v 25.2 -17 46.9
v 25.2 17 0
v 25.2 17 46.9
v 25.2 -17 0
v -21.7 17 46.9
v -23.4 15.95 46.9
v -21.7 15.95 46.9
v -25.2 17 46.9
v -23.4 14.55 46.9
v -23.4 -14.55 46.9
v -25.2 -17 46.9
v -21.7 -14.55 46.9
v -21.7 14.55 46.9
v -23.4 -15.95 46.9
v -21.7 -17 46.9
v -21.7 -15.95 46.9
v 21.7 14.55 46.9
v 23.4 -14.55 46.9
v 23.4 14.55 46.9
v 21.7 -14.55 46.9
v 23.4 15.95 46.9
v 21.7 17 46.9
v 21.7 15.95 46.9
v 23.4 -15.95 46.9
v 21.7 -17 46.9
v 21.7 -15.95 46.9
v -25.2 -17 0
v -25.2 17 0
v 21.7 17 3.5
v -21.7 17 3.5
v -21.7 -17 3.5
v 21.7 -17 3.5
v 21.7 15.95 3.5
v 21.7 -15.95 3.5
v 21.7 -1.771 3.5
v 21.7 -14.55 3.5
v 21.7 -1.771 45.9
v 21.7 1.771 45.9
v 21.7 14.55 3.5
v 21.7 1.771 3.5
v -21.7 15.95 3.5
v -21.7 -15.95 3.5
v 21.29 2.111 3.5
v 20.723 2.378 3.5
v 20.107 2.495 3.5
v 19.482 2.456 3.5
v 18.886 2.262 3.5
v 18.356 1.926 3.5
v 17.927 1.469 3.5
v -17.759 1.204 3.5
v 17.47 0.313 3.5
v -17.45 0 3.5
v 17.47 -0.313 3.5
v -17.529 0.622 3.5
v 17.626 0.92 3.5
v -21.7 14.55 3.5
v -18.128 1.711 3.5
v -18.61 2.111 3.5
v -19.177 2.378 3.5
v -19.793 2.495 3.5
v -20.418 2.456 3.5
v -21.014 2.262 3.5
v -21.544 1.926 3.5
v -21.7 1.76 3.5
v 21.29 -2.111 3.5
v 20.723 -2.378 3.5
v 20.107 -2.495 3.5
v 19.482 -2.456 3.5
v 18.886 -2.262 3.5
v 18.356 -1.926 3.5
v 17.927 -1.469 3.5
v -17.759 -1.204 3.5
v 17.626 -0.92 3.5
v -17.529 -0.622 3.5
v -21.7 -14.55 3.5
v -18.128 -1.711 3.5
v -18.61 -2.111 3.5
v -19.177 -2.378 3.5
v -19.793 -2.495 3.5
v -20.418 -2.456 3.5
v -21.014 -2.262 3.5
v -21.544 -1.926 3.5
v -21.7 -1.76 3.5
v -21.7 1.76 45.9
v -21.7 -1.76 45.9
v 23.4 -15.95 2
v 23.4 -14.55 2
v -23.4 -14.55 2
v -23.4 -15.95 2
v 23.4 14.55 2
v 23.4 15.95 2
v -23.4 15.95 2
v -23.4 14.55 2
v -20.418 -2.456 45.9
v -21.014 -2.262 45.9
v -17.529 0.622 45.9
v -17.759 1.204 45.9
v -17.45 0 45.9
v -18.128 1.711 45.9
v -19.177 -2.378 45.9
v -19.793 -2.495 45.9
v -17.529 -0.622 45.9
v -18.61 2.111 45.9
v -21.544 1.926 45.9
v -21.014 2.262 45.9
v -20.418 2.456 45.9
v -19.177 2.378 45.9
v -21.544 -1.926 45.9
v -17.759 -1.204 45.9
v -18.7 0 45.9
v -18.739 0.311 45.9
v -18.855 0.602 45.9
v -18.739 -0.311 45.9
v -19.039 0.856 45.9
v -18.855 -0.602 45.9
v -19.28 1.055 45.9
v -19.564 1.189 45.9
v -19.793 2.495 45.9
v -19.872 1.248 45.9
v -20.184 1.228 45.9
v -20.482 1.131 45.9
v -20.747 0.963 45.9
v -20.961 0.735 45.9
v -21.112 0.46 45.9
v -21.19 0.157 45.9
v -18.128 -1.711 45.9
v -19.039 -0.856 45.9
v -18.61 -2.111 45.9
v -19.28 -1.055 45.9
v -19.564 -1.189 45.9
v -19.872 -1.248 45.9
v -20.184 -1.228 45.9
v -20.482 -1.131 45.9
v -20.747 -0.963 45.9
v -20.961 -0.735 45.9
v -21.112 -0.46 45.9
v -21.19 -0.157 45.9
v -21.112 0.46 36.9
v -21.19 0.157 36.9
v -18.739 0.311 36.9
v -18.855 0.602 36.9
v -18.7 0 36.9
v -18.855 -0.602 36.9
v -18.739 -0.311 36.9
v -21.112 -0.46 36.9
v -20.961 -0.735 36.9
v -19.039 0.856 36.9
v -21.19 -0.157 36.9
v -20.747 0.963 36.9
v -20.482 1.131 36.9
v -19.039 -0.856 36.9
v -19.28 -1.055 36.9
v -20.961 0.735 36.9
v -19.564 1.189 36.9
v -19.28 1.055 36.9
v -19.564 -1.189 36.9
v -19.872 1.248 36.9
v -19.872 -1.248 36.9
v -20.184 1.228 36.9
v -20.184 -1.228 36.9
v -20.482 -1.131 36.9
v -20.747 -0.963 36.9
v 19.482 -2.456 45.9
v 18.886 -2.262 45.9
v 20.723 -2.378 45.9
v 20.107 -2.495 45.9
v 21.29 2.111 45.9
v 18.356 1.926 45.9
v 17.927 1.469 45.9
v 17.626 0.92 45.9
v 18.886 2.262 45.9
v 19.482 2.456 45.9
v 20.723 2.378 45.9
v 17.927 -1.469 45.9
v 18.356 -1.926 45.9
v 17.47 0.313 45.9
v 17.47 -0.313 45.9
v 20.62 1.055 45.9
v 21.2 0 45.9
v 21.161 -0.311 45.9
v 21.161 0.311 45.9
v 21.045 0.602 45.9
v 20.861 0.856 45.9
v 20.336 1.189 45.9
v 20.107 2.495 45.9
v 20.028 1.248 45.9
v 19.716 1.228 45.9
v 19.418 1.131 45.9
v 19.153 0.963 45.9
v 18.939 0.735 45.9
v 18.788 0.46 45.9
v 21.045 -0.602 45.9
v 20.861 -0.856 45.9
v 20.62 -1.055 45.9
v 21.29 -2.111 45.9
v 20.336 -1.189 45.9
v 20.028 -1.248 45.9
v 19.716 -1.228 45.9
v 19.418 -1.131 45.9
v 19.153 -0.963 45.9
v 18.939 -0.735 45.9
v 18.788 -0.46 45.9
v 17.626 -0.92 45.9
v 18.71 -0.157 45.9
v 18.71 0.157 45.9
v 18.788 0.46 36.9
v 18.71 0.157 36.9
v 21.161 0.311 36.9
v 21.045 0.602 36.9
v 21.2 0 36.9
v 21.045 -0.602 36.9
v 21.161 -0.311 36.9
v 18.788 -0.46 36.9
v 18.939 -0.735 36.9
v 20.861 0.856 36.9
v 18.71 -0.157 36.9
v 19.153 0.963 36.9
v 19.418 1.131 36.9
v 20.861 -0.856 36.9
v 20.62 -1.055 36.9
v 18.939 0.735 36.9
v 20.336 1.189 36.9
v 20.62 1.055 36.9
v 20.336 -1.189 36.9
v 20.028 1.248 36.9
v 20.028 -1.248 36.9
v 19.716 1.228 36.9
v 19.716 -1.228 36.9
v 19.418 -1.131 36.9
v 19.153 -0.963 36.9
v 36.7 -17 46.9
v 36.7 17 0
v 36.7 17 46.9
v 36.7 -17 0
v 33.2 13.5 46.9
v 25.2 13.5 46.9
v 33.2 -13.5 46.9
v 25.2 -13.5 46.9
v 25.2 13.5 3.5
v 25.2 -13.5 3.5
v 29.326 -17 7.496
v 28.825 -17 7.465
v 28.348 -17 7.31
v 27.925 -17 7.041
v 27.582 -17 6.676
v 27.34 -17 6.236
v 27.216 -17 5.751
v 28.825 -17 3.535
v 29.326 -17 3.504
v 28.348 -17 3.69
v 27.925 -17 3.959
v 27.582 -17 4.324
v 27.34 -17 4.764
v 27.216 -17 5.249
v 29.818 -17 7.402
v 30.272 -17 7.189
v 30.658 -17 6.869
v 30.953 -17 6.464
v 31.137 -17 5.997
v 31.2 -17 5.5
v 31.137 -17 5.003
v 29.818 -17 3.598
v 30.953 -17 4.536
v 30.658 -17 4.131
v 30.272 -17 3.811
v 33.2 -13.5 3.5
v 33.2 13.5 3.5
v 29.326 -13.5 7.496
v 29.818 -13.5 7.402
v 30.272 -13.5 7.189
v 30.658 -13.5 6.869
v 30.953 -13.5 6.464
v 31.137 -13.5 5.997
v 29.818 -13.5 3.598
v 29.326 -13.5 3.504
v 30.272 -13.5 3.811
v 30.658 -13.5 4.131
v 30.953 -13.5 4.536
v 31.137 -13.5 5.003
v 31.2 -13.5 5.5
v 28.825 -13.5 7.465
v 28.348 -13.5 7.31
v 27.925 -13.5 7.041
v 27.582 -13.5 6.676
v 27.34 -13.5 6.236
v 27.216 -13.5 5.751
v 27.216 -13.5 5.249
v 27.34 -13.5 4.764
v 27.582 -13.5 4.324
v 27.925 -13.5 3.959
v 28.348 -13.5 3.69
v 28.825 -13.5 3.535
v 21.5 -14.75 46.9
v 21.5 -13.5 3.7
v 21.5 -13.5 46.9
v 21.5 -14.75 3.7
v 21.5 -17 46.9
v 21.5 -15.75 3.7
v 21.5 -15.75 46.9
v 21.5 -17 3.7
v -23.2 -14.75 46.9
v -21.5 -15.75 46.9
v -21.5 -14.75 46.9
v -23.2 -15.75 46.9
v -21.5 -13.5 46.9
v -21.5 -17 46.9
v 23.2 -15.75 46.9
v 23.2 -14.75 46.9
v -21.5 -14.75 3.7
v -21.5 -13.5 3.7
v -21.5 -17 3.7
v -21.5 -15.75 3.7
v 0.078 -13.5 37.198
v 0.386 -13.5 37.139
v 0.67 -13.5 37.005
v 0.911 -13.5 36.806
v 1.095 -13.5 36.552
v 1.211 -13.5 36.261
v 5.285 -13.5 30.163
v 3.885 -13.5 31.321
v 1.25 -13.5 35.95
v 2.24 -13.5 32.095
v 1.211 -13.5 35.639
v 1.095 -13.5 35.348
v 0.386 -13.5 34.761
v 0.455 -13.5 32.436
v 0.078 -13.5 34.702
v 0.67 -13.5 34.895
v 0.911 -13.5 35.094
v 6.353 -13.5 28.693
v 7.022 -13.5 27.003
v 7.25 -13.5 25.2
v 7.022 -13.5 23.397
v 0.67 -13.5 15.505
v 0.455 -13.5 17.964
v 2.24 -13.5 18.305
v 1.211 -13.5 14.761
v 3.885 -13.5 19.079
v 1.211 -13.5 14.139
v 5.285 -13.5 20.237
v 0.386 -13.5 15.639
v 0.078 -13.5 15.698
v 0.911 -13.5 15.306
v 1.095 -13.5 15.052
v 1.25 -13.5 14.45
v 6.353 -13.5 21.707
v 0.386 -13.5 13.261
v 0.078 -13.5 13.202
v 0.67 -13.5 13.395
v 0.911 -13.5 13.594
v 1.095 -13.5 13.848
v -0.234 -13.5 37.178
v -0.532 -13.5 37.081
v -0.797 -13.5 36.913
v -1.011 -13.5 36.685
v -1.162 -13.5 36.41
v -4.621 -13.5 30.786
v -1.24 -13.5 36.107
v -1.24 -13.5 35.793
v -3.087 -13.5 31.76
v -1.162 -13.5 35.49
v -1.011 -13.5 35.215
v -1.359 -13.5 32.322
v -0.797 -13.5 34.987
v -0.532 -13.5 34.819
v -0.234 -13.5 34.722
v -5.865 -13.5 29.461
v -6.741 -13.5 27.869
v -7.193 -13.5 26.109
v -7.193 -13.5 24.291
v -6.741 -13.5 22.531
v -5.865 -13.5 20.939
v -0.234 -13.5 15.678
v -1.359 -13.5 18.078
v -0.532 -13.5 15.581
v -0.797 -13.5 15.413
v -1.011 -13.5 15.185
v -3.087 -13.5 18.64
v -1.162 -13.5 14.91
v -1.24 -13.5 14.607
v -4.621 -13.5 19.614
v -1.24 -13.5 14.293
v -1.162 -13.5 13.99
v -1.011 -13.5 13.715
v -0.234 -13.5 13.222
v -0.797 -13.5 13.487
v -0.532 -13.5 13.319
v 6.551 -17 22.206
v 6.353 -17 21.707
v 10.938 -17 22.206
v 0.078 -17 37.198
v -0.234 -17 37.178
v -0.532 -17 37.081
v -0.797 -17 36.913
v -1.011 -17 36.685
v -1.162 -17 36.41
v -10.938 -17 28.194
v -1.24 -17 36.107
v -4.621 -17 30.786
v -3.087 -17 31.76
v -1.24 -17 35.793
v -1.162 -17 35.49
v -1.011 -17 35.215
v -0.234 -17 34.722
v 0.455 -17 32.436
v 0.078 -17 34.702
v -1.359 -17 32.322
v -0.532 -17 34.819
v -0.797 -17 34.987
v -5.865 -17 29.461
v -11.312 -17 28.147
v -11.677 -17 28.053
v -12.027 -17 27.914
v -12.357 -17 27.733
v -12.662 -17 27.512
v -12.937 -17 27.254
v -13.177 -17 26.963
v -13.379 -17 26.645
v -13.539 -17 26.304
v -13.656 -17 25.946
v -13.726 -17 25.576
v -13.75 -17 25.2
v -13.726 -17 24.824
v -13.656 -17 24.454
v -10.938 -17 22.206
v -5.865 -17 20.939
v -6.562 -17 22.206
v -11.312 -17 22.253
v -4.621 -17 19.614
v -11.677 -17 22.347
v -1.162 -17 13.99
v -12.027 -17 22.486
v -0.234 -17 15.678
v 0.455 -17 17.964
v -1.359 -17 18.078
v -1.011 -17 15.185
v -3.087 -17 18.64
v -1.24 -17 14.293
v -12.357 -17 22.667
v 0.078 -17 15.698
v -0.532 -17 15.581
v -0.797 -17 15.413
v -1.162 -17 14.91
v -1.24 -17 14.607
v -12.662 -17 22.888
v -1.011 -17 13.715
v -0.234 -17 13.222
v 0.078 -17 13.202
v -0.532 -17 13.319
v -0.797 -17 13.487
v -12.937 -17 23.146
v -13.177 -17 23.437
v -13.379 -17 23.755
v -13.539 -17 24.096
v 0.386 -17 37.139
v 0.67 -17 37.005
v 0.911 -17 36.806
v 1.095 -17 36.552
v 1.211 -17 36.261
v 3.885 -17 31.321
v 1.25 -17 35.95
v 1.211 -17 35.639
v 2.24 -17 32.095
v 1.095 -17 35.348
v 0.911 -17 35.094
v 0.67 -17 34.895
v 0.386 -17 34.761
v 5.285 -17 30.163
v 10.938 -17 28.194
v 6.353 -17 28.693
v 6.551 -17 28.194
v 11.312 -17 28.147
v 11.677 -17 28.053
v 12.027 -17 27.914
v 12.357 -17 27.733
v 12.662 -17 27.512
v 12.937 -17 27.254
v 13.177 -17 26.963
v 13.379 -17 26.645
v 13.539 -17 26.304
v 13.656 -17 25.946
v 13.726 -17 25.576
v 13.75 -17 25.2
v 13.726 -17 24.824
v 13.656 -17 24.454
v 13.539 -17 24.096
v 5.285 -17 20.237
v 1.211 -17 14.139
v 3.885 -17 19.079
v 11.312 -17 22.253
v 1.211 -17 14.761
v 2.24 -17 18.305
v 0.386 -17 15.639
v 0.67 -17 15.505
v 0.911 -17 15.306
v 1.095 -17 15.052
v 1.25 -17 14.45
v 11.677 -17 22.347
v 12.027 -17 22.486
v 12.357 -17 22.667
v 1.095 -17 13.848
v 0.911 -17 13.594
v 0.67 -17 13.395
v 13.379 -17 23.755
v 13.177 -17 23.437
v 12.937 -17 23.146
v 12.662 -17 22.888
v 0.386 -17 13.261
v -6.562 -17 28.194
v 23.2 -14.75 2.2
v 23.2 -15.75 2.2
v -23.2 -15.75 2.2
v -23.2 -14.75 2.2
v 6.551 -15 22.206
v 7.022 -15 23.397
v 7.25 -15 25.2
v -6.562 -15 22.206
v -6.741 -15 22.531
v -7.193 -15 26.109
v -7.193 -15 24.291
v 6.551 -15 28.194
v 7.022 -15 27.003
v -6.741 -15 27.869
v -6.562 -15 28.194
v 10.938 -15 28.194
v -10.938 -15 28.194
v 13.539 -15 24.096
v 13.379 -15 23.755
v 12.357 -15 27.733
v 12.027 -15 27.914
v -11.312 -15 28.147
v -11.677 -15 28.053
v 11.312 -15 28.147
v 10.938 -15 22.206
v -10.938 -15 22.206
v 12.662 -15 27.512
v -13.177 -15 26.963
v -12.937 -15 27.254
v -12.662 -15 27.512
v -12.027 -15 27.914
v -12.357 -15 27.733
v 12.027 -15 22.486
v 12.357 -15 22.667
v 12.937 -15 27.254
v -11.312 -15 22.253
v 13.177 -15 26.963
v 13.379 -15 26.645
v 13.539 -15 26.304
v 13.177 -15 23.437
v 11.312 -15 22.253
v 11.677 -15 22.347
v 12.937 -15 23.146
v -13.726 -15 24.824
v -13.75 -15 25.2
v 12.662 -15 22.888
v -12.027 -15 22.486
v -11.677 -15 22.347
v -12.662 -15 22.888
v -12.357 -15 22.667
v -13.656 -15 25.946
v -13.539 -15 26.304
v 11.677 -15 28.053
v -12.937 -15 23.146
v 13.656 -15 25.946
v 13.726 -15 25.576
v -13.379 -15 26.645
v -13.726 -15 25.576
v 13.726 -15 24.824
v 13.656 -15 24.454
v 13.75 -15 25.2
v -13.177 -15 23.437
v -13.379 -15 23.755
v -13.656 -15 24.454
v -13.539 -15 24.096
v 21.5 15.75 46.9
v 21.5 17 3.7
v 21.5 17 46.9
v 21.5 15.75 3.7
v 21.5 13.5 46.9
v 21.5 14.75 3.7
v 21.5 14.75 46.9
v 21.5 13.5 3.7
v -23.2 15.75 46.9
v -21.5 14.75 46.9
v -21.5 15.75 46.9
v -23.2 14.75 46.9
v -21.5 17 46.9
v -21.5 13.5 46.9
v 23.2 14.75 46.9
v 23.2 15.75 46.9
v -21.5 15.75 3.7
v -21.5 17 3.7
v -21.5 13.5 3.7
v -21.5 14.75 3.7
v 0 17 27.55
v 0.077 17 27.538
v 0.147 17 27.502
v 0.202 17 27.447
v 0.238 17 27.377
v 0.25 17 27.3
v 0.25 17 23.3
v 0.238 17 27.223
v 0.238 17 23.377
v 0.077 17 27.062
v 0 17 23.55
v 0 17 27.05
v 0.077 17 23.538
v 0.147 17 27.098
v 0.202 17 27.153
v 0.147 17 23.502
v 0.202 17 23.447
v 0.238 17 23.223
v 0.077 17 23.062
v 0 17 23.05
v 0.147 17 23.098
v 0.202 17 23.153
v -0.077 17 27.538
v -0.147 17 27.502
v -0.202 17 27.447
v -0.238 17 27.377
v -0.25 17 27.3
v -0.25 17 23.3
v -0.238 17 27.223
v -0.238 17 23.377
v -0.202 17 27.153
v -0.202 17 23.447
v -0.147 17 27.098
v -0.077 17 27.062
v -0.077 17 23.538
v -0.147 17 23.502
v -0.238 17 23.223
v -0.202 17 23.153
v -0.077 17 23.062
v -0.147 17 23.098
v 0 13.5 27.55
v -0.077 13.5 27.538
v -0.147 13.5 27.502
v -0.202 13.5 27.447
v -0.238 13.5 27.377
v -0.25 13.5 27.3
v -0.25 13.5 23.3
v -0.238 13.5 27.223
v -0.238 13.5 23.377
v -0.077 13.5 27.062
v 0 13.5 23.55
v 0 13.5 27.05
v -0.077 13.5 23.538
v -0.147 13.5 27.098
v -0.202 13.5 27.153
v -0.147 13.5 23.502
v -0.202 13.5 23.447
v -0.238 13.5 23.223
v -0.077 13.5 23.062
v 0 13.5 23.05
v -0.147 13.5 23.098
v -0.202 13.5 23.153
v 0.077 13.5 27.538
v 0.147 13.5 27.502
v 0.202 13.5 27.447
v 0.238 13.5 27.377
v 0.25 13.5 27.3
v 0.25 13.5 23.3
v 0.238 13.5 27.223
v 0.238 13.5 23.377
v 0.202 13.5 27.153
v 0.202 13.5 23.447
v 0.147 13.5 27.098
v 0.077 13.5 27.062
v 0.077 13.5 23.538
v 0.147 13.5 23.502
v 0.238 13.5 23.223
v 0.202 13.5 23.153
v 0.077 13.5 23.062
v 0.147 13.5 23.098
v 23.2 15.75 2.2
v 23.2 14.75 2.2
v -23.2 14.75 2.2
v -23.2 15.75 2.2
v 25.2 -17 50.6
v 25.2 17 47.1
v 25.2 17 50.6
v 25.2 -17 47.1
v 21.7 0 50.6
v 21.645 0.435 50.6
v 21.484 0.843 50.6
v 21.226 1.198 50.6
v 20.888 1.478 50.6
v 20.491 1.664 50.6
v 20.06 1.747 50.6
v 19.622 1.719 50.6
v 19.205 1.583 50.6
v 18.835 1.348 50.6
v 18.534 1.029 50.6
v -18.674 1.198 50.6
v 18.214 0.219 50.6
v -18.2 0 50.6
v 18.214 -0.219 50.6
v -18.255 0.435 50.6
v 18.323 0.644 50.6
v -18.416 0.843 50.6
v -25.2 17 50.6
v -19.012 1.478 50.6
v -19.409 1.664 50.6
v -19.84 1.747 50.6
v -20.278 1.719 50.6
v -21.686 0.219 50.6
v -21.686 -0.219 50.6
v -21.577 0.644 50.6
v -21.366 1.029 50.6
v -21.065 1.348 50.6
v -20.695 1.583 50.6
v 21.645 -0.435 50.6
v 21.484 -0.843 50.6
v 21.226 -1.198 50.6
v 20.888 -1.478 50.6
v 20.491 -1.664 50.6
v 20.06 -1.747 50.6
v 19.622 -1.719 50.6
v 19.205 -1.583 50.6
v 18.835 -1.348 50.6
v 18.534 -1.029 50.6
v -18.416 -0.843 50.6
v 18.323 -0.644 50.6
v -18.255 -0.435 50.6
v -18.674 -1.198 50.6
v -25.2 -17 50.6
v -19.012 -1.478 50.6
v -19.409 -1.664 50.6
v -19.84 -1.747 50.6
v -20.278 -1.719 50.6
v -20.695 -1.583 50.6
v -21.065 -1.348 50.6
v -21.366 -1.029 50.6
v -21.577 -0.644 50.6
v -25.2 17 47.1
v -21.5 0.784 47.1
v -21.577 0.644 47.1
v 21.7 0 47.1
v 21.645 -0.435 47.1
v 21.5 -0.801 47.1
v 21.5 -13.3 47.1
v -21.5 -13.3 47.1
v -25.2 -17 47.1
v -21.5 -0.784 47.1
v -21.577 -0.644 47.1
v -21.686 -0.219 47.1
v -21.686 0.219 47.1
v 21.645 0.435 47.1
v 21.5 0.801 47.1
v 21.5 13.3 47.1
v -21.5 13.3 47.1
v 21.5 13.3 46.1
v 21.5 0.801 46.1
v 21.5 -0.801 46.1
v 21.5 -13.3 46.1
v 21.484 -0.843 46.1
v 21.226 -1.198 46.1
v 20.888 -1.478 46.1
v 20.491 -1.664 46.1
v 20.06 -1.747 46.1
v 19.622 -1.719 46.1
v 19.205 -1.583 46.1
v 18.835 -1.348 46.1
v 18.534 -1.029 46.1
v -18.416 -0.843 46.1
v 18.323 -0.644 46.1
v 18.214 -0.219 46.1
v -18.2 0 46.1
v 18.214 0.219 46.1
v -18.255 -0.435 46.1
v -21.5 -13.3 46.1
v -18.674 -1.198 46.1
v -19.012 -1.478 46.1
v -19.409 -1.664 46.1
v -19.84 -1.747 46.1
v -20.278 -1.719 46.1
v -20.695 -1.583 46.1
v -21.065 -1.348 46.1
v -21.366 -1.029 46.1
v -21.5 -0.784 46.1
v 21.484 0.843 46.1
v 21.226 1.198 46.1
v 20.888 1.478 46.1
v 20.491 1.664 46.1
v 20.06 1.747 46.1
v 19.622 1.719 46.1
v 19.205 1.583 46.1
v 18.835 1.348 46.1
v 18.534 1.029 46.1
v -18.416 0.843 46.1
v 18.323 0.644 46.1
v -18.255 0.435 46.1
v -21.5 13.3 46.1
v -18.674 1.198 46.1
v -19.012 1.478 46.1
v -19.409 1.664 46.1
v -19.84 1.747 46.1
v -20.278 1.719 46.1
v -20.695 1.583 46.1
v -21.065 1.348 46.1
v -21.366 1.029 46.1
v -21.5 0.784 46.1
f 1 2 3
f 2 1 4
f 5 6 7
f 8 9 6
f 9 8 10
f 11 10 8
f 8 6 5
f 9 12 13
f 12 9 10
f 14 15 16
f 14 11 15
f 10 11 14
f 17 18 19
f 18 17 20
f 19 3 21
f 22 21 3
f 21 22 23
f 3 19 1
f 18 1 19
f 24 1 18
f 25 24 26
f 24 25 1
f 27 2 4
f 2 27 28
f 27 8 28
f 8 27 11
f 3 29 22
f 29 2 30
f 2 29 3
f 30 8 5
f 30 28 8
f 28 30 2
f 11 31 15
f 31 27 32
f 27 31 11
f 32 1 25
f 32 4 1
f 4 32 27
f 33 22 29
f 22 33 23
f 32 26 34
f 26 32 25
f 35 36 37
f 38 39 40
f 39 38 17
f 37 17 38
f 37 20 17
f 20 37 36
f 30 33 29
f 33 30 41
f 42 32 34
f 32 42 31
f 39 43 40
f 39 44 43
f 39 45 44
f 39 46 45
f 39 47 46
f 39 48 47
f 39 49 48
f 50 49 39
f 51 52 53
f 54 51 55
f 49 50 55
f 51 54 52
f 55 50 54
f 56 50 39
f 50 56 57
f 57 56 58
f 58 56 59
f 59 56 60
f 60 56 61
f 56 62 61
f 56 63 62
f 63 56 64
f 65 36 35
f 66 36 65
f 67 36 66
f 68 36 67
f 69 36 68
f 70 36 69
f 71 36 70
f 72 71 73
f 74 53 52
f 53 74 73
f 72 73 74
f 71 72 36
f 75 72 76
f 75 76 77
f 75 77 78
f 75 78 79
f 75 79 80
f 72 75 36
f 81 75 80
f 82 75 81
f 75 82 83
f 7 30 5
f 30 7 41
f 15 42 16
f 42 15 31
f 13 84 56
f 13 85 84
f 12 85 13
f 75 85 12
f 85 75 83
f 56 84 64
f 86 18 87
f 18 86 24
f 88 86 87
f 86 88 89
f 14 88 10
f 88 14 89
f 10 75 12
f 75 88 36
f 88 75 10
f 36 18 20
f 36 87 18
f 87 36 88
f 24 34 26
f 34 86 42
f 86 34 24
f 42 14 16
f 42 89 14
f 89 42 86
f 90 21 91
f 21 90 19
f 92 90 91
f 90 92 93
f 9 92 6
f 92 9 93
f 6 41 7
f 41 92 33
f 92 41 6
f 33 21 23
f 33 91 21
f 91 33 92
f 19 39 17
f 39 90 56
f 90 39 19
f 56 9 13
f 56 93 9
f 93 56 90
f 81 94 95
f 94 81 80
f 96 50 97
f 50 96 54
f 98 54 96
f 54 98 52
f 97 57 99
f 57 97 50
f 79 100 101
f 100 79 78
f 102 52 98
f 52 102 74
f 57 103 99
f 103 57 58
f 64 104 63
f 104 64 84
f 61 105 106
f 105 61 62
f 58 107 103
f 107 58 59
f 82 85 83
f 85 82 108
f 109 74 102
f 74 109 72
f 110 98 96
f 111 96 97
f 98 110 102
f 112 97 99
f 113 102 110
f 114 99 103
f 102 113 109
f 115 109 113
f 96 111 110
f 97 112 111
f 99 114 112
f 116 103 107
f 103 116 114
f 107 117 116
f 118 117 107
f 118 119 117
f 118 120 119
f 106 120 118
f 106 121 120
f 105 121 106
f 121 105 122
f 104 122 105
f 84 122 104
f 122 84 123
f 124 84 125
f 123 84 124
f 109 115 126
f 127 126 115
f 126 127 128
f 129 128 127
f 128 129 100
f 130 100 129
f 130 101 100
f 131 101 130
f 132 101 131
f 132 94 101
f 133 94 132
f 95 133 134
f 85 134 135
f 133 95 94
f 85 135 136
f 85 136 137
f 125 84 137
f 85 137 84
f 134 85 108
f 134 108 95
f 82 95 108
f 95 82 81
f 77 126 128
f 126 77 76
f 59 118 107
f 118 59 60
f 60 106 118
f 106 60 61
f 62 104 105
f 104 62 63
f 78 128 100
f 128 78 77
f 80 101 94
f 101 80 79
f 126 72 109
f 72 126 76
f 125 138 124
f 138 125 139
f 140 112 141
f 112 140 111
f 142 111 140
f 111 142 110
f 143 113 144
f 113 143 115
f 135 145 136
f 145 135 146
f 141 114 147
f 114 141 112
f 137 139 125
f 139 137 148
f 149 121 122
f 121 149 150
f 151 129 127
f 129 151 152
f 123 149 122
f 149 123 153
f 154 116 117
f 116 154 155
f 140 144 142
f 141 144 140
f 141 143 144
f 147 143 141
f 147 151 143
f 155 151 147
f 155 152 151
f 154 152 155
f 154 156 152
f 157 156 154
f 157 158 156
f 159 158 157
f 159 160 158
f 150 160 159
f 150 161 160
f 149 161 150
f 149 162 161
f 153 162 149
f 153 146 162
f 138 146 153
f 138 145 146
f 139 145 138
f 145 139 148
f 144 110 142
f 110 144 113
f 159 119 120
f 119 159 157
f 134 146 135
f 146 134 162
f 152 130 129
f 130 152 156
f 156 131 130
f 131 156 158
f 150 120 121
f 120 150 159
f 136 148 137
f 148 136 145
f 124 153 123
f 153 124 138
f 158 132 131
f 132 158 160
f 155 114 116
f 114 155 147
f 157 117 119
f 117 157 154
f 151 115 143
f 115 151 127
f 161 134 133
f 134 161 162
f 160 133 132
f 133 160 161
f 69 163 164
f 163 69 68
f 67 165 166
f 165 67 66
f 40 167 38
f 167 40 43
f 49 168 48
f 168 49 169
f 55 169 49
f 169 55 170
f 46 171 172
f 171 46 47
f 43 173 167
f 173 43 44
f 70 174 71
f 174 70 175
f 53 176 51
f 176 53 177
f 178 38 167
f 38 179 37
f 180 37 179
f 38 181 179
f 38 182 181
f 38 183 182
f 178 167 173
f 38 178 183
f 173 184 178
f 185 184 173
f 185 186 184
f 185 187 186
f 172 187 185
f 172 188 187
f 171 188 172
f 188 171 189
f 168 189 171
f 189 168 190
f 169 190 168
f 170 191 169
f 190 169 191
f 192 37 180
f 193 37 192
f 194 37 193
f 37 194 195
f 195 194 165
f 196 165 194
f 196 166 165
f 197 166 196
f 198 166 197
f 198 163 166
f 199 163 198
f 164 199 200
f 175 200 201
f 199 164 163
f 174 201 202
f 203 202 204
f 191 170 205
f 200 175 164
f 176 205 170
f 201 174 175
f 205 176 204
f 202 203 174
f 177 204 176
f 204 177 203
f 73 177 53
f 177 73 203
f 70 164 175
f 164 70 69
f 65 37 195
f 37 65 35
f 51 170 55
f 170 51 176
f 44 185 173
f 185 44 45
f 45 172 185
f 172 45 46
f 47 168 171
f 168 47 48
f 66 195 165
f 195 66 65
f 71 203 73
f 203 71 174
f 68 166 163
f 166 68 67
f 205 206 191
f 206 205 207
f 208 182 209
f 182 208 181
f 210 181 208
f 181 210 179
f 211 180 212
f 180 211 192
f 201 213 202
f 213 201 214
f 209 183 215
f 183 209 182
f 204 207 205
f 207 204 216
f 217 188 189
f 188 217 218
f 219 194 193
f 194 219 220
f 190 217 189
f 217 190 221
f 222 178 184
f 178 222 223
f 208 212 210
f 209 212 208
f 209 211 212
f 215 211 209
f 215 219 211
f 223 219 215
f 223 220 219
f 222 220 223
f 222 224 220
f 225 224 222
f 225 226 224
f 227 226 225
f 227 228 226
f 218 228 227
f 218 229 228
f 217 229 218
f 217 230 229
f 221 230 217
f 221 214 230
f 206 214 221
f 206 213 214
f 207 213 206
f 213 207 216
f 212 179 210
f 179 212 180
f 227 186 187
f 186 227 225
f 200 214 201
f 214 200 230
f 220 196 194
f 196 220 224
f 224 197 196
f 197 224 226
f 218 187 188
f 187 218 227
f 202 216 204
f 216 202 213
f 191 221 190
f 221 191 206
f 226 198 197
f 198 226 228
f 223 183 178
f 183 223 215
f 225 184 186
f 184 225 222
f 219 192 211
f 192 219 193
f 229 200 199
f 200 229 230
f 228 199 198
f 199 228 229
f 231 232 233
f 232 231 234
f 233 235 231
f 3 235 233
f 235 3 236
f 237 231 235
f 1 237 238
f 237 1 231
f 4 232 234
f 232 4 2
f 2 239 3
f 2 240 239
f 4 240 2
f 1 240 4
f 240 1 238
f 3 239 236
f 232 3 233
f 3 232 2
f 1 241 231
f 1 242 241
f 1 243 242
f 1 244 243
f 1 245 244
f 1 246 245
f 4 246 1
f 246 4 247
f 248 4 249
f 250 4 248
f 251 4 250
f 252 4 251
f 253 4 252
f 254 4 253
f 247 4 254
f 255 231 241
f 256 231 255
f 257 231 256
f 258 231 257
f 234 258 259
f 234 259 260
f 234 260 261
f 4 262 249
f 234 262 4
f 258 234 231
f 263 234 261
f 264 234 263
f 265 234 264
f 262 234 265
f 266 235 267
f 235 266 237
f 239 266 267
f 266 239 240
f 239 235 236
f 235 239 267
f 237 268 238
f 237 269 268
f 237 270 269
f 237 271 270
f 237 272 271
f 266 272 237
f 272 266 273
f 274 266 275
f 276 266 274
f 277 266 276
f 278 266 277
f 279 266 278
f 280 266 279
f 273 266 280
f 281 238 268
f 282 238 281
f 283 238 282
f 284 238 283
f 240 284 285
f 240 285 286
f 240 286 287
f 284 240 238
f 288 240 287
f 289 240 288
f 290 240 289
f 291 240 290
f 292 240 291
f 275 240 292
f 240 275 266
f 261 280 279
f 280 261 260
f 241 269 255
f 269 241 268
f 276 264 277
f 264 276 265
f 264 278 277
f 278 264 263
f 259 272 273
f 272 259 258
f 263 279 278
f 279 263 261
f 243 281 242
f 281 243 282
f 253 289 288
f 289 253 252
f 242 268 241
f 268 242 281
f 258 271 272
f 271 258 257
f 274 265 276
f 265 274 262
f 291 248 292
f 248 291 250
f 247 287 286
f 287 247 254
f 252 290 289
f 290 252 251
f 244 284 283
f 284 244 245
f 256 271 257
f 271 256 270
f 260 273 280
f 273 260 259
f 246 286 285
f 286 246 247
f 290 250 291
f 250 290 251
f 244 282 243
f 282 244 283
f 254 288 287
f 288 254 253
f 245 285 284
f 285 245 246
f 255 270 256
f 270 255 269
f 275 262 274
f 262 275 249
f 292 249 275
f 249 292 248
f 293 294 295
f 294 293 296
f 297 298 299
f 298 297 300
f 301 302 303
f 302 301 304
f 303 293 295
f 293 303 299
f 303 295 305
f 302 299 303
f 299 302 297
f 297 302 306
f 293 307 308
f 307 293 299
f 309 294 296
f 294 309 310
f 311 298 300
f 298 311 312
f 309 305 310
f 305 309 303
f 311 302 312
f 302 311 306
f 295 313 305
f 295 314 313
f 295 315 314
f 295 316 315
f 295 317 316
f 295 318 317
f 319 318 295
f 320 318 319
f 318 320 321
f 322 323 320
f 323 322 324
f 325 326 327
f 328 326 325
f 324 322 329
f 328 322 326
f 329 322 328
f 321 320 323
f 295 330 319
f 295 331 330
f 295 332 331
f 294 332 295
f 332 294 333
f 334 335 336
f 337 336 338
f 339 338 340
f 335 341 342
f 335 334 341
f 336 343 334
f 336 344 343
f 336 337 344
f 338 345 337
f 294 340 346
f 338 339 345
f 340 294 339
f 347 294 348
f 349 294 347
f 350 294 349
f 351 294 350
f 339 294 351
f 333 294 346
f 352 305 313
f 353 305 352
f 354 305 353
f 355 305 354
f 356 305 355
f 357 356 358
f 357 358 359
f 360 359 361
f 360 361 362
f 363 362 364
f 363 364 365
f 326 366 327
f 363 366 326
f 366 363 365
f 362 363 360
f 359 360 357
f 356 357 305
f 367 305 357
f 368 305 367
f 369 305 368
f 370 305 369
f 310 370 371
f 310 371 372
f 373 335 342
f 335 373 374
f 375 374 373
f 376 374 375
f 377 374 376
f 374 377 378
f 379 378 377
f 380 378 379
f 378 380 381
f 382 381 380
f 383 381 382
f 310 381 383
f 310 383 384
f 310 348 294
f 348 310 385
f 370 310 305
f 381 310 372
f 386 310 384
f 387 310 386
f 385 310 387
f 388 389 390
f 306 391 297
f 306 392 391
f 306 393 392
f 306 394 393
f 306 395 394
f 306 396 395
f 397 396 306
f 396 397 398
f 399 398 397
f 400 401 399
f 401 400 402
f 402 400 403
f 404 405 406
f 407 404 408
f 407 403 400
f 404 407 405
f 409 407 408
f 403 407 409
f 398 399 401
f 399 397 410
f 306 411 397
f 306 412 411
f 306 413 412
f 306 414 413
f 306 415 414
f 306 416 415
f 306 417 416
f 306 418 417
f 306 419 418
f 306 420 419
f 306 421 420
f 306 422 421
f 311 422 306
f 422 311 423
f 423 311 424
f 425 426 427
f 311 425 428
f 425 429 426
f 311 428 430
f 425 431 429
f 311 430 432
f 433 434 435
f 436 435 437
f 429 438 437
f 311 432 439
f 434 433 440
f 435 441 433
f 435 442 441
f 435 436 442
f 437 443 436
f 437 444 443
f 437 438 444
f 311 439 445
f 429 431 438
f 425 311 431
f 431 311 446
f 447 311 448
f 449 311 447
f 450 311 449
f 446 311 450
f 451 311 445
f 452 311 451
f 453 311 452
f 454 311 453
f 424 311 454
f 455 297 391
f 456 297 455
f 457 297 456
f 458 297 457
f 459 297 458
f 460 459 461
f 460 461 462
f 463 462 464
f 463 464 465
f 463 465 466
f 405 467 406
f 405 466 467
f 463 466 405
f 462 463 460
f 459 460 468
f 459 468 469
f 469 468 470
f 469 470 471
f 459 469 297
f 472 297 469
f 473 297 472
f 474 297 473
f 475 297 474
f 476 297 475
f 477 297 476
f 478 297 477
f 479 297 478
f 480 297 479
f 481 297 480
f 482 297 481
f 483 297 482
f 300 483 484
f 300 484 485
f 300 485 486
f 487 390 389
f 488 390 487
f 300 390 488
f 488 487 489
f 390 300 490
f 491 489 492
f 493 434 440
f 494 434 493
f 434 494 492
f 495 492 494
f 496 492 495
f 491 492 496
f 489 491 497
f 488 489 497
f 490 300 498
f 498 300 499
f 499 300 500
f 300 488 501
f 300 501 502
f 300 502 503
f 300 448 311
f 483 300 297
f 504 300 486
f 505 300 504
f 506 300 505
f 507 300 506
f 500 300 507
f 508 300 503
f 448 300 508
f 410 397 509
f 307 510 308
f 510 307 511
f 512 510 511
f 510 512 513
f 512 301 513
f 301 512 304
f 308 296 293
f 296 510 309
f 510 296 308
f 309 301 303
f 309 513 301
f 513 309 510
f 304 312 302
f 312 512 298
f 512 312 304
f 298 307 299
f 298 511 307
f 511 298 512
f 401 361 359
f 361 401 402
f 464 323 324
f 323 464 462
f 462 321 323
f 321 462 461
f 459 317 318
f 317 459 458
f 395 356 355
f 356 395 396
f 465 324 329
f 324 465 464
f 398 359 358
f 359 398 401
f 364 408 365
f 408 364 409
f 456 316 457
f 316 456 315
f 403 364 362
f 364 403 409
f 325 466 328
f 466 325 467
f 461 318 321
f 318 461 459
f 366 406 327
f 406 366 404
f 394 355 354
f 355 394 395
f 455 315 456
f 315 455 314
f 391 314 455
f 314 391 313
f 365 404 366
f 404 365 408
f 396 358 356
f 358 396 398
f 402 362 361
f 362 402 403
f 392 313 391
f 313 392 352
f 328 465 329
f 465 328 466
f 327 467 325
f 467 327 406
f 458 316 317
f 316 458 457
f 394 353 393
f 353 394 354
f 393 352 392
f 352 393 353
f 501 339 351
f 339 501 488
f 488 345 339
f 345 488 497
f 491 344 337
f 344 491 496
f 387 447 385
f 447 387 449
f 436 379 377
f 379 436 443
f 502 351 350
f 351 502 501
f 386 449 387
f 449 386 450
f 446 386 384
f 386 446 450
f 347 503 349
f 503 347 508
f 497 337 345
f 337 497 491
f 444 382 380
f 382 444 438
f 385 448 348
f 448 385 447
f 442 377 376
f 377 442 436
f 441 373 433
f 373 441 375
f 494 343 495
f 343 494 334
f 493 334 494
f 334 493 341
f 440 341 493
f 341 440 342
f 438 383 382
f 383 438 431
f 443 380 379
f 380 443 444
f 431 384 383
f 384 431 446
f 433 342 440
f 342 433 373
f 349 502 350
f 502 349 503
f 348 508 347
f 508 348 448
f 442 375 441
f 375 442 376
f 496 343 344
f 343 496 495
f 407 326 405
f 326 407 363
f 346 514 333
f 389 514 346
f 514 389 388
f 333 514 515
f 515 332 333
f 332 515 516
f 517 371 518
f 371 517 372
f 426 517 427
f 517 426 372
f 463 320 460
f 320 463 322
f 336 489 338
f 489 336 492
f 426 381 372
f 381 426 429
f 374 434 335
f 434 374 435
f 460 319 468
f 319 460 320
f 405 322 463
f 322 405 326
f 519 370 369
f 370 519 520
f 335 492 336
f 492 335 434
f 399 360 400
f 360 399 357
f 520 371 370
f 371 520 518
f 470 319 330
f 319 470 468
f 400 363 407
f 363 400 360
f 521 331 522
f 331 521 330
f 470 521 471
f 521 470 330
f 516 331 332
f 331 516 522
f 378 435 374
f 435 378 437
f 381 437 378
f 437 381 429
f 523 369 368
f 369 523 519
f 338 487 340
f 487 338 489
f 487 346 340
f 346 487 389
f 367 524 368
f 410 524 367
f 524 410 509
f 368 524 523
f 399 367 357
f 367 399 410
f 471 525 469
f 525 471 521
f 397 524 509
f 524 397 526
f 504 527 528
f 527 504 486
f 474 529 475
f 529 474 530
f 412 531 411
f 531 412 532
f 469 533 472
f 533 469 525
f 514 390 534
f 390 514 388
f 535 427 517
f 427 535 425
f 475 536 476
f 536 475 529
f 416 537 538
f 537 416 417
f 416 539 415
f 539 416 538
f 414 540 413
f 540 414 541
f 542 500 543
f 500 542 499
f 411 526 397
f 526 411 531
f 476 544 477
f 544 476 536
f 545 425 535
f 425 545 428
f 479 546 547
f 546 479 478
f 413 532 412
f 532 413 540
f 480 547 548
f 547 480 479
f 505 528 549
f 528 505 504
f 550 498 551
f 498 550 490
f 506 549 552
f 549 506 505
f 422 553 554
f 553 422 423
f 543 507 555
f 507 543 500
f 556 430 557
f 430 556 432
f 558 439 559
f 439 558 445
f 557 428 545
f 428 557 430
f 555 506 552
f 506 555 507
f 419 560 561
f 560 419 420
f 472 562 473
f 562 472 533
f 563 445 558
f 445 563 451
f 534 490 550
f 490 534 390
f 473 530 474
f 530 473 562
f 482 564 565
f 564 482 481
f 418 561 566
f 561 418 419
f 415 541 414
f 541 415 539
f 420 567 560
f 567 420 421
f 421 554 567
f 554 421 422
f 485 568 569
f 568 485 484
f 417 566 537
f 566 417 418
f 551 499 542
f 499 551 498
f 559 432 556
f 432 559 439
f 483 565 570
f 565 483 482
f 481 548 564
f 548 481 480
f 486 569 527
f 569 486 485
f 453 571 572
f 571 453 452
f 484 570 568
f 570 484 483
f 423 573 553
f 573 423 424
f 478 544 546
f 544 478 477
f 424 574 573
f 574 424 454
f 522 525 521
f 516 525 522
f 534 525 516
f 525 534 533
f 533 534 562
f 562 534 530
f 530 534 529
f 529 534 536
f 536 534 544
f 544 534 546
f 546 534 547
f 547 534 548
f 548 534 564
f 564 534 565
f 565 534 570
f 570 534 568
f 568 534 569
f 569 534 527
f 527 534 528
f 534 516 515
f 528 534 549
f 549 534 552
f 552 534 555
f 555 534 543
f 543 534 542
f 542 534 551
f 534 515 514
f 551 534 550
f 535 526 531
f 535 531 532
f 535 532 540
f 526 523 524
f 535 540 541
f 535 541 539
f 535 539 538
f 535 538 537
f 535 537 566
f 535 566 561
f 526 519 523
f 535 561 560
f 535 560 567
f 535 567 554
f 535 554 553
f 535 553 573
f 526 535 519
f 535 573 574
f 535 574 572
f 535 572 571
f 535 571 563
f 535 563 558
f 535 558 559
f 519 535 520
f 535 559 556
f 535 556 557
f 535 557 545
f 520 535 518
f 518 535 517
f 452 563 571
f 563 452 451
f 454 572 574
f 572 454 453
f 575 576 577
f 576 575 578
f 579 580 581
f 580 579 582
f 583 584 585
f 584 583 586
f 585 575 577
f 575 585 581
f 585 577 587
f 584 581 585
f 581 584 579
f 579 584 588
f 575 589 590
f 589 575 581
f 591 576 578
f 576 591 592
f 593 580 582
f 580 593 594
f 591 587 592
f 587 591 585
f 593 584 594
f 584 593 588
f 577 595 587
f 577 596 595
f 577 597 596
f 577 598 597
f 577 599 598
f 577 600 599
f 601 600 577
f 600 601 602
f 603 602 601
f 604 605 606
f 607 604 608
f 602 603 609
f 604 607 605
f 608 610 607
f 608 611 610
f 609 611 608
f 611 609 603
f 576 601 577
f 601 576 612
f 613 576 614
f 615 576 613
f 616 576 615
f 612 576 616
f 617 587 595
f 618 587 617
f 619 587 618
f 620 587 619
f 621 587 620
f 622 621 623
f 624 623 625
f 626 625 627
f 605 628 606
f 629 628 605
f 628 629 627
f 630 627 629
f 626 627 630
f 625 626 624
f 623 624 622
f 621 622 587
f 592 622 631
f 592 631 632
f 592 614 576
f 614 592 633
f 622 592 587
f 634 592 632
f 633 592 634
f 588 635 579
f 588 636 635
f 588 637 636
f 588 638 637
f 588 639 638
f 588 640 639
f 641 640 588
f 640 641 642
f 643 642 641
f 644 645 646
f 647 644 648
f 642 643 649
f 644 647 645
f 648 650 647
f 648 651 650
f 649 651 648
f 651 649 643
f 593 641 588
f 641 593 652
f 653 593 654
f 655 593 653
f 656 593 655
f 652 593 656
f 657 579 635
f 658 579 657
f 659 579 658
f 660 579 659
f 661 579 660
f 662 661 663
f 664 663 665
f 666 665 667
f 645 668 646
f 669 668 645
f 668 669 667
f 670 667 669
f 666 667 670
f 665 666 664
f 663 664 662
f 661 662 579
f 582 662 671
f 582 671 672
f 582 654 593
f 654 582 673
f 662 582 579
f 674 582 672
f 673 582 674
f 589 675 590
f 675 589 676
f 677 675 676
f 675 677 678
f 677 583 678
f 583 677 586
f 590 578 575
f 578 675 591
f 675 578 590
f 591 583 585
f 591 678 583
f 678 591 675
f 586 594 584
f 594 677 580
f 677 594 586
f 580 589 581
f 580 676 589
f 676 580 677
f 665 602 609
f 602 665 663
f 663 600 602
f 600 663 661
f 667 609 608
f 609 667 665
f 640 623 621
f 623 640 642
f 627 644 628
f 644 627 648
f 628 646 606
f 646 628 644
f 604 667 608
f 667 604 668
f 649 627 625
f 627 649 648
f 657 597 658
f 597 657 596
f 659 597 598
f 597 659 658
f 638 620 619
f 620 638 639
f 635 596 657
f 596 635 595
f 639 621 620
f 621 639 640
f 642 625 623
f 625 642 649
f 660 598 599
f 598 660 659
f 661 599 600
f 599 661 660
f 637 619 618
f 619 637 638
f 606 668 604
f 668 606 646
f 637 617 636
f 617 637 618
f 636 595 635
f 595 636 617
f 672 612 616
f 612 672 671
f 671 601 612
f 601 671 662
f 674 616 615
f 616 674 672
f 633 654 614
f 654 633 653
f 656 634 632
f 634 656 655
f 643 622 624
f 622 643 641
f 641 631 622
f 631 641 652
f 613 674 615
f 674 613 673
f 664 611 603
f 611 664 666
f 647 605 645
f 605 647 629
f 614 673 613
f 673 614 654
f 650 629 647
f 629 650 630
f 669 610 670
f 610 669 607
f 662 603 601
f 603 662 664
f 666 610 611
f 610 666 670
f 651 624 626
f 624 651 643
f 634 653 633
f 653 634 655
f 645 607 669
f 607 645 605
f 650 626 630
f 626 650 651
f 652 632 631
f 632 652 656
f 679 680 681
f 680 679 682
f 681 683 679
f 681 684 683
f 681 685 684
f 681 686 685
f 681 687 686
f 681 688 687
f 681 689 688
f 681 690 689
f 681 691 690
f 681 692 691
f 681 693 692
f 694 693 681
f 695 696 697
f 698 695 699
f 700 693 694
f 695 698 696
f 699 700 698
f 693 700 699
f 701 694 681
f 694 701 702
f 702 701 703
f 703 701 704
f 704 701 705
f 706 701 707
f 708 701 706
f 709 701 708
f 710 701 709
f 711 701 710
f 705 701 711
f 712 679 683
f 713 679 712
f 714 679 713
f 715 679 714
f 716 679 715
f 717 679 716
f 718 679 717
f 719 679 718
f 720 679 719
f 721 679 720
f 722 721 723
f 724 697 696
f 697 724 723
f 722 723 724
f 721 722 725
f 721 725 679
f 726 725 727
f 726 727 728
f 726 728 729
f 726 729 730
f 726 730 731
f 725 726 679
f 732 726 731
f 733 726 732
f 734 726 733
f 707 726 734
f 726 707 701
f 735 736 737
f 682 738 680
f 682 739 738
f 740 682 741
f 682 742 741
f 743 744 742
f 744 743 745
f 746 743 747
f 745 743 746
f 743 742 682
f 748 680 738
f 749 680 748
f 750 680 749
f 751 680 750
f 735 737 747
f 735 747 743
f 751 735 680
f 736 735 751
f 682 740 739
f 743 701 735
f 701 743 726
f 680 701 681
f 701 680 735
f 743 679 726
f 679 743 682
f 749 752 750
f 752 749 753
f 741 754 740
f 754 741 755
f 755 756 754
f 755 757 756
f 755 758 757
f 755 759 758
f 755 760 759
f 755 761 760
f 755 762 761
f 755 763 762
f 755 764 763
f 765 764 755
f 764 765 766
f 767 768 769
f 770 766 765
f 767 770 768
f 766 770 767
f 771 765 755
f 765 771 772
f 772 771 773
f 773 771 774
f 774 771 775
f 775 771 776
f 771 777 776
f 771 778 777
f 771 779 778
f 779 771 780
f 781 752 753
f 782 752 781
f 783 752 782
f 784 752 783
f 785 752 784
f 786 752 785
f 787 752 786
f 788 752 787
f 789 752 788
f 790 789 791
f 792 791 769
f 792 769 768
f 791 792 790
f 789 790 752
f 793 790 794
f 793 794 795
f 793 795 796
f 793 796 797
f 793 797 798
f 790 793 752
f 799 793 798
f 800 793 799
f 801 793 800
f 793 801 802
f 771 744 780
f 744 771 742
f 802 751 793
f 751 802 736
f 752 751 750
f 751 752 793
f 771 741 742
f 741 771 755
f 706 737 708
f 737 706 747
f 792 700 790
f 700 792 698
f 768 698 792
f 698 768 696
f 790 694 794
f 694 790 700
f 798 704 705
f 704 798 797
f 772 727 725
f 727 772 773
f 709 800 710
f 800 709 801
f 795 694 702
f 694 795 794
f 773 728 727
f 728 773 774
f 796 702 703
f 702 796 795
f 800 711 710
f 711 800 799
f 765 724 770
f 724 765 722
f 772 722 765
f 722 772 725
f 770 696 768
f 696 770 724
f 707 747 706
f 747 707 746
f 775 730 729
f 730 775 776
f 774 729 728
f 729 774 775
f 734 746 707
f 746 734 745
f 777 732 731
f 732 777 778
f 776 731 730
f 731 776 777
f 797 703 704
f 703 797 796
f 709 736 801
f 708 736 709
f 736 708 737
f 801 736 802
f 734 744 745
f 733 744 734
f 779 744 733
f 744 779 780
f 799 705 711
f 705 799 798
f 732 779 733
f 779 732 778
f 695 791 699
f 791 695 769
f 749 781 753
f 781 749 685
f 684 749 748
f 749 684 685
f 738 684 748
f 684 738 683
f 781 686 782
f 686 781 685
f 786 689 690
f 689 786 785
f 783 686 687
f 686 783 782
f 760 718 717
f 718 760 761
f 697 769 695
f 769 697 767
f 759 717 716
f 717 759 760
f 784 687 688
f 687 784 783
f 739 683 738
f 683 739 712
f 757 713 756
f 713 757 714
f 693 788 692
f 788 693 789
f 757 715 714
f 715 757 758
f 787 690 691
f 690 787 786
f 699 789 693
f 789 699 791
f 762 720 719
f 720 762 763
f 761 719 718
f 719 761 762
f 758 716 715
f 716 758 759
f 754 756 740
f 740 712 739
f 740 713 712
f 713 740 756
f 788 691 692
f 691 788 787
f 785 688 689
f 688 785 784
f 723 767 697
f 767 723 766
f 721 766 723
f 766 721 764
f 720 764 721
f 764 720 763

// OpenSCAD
bulbFixtureBaseRadius = 30.0 / 2;
bulbFixtureBaseDepth = 5.0;
bulbFixtureStemRadius = 14.5 / 2;
bulbFixtureStemDepth = 11.5;

bulbFixtureContactScrewHeadRadius = 6.0 / 2;
bulbFixtureContactScrewHeadDepth = 4.0 / 2;
bulbFixtureContactScrewHeadSeparation = 21.5;

bulbFixtuireMountingHoleRadius = 2.5 / 2;
bulbFixtuireMountingHoleSeparation = 21.5;

bulbHeight = 14.0;
bulbRadius = 11.5 / 2;

ldrDepth = 1.0;
ldrRadius = 6.0 / 2;
ldrLegSeparation = 4.0;
ldrLegRadius = 0.5 / 2;

bulbLdrSeparation = 4.0;

wallWidthOffset = 5.0;

wallNotchWidth = 1.0;
wallNotchDepth = 1.5;
wallNotchWidthClearance = 0.2;
wallNotchDepthClearance = 0.2;

lidNotchDepth = 1.0;
lidNotchClearance = 0.2;
lidScrewRadius = 2.5 / 2;
lidScrewLength = 10.0;
lidScrewClearanceRadius = 3.5 / 2;
lidScrewPostRadius = 5.0 / 2;

circuitryPocketDepth = 8.0;
circuitryPocketWireHoleRadius = 4.0 / 2;

wallThickness = 3.5;


cavityWidth = bulbFixtureBaseRadius * 2 + (wallWidthOffset + wallNotchDepth + wallNotchDepthClearance) * 2;
cavityLength = bulbFixtureStemDepth + bulbHeight + ldrDepth + bulbLdrSeparation - wallThickness;


//translate([0, -(cavityLength / 2 + wallThickness), cavityWidth / 2 + wallThickness]) {
//  rotate([-90, 0, 0]) {
//    translate([0, 0, -bulbFixtureBaseDepth]) {
//      BulbFixture(true);
//    }
//  }
//}


difference() {
  union() {
    Chassis();
    CircuitryPocket();
    BulbWall();
    LdrWall();
    Lid();
  }
  
//  translate([0, -50, 0]) {
//    cube([100, 100, 100]);
//  }
}

module CircuitryPocket() {
  translate([cavityWidth / 2 + wallThickness, -(cavityLength / 2 + wallThickness), 0]) {
    difference() {
      // Body
      cube([circuitryPocketDepth + wallThickness, cavityLength + 2 * wallThickness, cavityWidth + wallThickness]);
      
      // Circuity cutout
      translate([0, wallThickness, wallThickness]) {
        cube([circuitryPocketDepth, cavityLength, cavityWidth]);
      }
      
      // Wire hole
      translate([circuitryPocketDepth / 2, 0, wallThickness + circuitryPocketWireHoleRadius]) {
        rotate([-90, 0, 0]) {
          #cylinder(wallThickness, circuitryPocketWireHoleRadius, circuitryPocketWireHoleRadius, $fn = 25);
        }
      }
    }
  }
}


module Lid() {
  translate([0, 0, cavityWidth + wallThickness + lidNotchClearance]) {
    difference() {
      union() {
        // Main plate
        translate([-(cavityWidth / 2 + wallThickness), -(cavityLength / 2 + wallThickness), 0]) {
          cube([cavityWidth + wallThickness * 2, cavityLength + wallThickness * 2, wallThickness]);
        }
        // Notch tab
        translate([-(cavityWidth / 2 - lidNotchClearance), -(cavityLength / 2 - lidNotchClearance), -lidNotchDepth]) {
          cube([cavityWidth - lidNotchClearance * 2, cavityLength - lidNotchClearance * 2, wallThickness]);
        }
      }
      
      // Lid screw holes
      for (x = [-1, 1]) {
        translate([x * (cavityWidth / 2 - lidScrewClearanceRadius), 0, -lidNotchDepth]) {
          cylinder(wallThickness + lidNotchDepth, lidScrewClearanceRadius, lidScrewClearanceRadius, $fn = 25);
        }
      }
    }
  }
}

module LdrWall() {
  translate([-(cavityWidth / 2 - wallNotchDepthClearance), cavityLength / 2, wallThickness + wallNotchDepthClearance]) {
    difference() {
      union() {
        // Main wall
        cube([cavityWidth - wallNotchDepthClearance * 2, wallThickness, cavityWidth - wallNotchDepthClearance]);
        
        // Notch tab
        translate([-(wallNotchDepth + wallNotchDepthClearance), (wallThickness - wallNotchWidth) / 2, -wallNotchDepth]) {
          cube([cavityWidth + 2 * wallNotchDepth, wallNotchWidth, cavityWidth + wallNotchDepth - wallNotchDepthClearance]);
        }
      }
      
      // LDR leg holes
      translate([cavityWidth / 2 - wallNotchDepthClearance, 0, (cavityWidth - wallNotchDepthClearance) / 2]) {
        rotate([-90, 0, 0]) {
          for (i = [-0.5, 0.5]) {
            translate([0, i * ldrLegSeparation, 0]) {
              cylinder(wallThickness, ldrLegRadius, ldrLegRadius, $fn=20);
            }
          }
        }
      }
    }
  }
}

module BulbWall() {
  translate([0, -(cavityLength / 2 + wallThickness), wallThickness + wallNotchDepthClearance]) {
    difference() {
      translate([-(cavityWidth / 2 - wallNotchDepthClearance), 0, 0]) {
        union() {
          // Main wall
          cube([cavityWidth - wallNotchDepthClearance * 2, wallThickness, cavityWidth - wallNotchDepthClearance]);
          
          // Notch tab
          translate([-(wallNotchDepth + wallNotchDepthClearance), (wallThickness - wallNotchWidth) / 2, -wallNotchDepth]) {
            cube([cavityWidth + 2 * wallNotchDepth, wallNotchWidth, cavityWidth + wallNotchDepth - wallNotchDepthClearance]);
          }
        }
      }
      // Bulb fixture hole
      rotate([-90, 0, 0]) {
        translate([0, -(cavityWidth / 2 - wallNotchDepthClearance), 0]) {
          cylinder(wallThickness, bulbFixtureStemRadius, bulbFixtureStemRadius, $fn = 25);
        }
      }
      // Contact screw head cutouts
      translate([0, 0, cavityWidth / 2 - wallNotchDepthClearance]) {
        rotate([-90, 0, 0]) {
          hull() {
            for (i = [-1, 1]) {
              translate([i * bulbFixtureContactScrewHeadSeparation / 2, 0, 0]) {
                cylinder(bulbFixtureContactScrewHeadDepth, bulbFixtureContactScrewHeadRadius, bulbFixtureContactScrewHeadRadius, $fn = 50);
              }
            }
          }
        }
      }
      // Mounting screw holes
      translate([0, 0, cavityWidth / 2 - wallNotchDepthClearance]) {
        rotate([-90, 0, 0]) {
          for (i = [-1, 1]) {
            translate([0, i * bulbFixtuireMountingHoleSeparation / 2, 0]) {
              cylinder(wallThickness, bulbFixtuireMountingHoleRadius, bulbFixtuireMountingHoleRadius, $fn = 25);
            }
          }
        }
      }
    }
  }
}

module Chassis() {
  difference() {
    // Main body
    translate([-(cavityWidth / 2 + wallThickness), -(cavityLength / 2 + wallThickness), 0]) {
      cube([cavityWidth + 2 * wallThickness, cavityLength + 2 * wallThickness, cavityWidth + wallThickness]);
    }
    
    // Cavity cutout
    translate([-cavityWidth / 2, -(cavityLength / 2 + wallThickness), wallThickness]) {
      cube([cavityWidth, cavityLength + 2 * wallThickness, cavityWidth]);
    }
    
    // Bulb wall notch
    translate([-(cavityWidth / 2 + wallNotchDepth + wallNotchDepthClearance), -((cavityLength + wallThickness) / 2 + wallNotchWidth / 2 + wallNotchWidthClearance), wallThickness - wallNotchDepth]) {
      cube([cavityWidth + 2 * (wallNotchDepth + wallNotchDepthClearance), wallNotchWidth + 2 * wallNotchWidthClearance, cavityWidth + wallNotchDepth]);
    }
    
    // LDR wall notch
    translate([-(cavityWidth / 2 + wallNotchDepth + wallNotchDepthClearance), (cavityLength + wallThickness) / 2 - (wallNotchWidth / 2 + wallNotchWidthClearance), wallThickness - wallNotchDepth]) {
      cube([cavityWidth + 2 * (wallNotchDepth + wallNotchDepthClearance), wallNotchWidth + 2 * wallNotchWidthClearance, cavityWidth + wallNotchDepth]);
    }
  }
  
  // Lid screw posts
  for (x = [-1, 1]) {
    translate([x * (cavityWidth / 2 - lidScrewClearanceRadius), 0, wallThickness]) {
      difference() {
        cylinder(cavityWidth - lidNotchDepth, lidScrewPostRadius, lidScrewPostRadius, $fn = 25);
        translate([0, 0, cavityWidth - lidScrewLength]) {
          cylinder(lidScrewLength, lidScrewRadius, lidScrewRadius, $fn = 25);
        }
      }
    }
  }
}

module BulbFixture(includeBulb = false) {
  // Base
  cylinder(bulbFixtureBaseDepth, bulbFixtureBaseRadius, bulbFixtureBaseRadius, $fn = 50);
  // Stem
  cylinder(bulbFixtureBaseDepth + bulbFixtureStemDepth, bulbFixtureStemRadius, bulbFixtureStemRadius, $fn = 50);
  // Contact screw heads
  for (theta = [0, 180]) {
    rotate([0, 0, theta]) {
      translate([bulbFixtureContactScrewHeadSeparation / 2, 0, bulbFixtureBaseDepth]) {
        cylinder(bulbFixtureContactScrewHeadDepth, bulbFixtureContactScrewHeadRadius, bulbFixtureContactScrewHeadRadius, $fn = 50);
      }
    }
  }
  // Bulb
  if (includeBulb) {
    translate([0, 0, bulbFixtureBaseDepth + bulbFixtureStemDepth + bulbHeight - bulbRadius]) {
      sphere(bulbRadius, $fn = 25);
    }
  }
}
